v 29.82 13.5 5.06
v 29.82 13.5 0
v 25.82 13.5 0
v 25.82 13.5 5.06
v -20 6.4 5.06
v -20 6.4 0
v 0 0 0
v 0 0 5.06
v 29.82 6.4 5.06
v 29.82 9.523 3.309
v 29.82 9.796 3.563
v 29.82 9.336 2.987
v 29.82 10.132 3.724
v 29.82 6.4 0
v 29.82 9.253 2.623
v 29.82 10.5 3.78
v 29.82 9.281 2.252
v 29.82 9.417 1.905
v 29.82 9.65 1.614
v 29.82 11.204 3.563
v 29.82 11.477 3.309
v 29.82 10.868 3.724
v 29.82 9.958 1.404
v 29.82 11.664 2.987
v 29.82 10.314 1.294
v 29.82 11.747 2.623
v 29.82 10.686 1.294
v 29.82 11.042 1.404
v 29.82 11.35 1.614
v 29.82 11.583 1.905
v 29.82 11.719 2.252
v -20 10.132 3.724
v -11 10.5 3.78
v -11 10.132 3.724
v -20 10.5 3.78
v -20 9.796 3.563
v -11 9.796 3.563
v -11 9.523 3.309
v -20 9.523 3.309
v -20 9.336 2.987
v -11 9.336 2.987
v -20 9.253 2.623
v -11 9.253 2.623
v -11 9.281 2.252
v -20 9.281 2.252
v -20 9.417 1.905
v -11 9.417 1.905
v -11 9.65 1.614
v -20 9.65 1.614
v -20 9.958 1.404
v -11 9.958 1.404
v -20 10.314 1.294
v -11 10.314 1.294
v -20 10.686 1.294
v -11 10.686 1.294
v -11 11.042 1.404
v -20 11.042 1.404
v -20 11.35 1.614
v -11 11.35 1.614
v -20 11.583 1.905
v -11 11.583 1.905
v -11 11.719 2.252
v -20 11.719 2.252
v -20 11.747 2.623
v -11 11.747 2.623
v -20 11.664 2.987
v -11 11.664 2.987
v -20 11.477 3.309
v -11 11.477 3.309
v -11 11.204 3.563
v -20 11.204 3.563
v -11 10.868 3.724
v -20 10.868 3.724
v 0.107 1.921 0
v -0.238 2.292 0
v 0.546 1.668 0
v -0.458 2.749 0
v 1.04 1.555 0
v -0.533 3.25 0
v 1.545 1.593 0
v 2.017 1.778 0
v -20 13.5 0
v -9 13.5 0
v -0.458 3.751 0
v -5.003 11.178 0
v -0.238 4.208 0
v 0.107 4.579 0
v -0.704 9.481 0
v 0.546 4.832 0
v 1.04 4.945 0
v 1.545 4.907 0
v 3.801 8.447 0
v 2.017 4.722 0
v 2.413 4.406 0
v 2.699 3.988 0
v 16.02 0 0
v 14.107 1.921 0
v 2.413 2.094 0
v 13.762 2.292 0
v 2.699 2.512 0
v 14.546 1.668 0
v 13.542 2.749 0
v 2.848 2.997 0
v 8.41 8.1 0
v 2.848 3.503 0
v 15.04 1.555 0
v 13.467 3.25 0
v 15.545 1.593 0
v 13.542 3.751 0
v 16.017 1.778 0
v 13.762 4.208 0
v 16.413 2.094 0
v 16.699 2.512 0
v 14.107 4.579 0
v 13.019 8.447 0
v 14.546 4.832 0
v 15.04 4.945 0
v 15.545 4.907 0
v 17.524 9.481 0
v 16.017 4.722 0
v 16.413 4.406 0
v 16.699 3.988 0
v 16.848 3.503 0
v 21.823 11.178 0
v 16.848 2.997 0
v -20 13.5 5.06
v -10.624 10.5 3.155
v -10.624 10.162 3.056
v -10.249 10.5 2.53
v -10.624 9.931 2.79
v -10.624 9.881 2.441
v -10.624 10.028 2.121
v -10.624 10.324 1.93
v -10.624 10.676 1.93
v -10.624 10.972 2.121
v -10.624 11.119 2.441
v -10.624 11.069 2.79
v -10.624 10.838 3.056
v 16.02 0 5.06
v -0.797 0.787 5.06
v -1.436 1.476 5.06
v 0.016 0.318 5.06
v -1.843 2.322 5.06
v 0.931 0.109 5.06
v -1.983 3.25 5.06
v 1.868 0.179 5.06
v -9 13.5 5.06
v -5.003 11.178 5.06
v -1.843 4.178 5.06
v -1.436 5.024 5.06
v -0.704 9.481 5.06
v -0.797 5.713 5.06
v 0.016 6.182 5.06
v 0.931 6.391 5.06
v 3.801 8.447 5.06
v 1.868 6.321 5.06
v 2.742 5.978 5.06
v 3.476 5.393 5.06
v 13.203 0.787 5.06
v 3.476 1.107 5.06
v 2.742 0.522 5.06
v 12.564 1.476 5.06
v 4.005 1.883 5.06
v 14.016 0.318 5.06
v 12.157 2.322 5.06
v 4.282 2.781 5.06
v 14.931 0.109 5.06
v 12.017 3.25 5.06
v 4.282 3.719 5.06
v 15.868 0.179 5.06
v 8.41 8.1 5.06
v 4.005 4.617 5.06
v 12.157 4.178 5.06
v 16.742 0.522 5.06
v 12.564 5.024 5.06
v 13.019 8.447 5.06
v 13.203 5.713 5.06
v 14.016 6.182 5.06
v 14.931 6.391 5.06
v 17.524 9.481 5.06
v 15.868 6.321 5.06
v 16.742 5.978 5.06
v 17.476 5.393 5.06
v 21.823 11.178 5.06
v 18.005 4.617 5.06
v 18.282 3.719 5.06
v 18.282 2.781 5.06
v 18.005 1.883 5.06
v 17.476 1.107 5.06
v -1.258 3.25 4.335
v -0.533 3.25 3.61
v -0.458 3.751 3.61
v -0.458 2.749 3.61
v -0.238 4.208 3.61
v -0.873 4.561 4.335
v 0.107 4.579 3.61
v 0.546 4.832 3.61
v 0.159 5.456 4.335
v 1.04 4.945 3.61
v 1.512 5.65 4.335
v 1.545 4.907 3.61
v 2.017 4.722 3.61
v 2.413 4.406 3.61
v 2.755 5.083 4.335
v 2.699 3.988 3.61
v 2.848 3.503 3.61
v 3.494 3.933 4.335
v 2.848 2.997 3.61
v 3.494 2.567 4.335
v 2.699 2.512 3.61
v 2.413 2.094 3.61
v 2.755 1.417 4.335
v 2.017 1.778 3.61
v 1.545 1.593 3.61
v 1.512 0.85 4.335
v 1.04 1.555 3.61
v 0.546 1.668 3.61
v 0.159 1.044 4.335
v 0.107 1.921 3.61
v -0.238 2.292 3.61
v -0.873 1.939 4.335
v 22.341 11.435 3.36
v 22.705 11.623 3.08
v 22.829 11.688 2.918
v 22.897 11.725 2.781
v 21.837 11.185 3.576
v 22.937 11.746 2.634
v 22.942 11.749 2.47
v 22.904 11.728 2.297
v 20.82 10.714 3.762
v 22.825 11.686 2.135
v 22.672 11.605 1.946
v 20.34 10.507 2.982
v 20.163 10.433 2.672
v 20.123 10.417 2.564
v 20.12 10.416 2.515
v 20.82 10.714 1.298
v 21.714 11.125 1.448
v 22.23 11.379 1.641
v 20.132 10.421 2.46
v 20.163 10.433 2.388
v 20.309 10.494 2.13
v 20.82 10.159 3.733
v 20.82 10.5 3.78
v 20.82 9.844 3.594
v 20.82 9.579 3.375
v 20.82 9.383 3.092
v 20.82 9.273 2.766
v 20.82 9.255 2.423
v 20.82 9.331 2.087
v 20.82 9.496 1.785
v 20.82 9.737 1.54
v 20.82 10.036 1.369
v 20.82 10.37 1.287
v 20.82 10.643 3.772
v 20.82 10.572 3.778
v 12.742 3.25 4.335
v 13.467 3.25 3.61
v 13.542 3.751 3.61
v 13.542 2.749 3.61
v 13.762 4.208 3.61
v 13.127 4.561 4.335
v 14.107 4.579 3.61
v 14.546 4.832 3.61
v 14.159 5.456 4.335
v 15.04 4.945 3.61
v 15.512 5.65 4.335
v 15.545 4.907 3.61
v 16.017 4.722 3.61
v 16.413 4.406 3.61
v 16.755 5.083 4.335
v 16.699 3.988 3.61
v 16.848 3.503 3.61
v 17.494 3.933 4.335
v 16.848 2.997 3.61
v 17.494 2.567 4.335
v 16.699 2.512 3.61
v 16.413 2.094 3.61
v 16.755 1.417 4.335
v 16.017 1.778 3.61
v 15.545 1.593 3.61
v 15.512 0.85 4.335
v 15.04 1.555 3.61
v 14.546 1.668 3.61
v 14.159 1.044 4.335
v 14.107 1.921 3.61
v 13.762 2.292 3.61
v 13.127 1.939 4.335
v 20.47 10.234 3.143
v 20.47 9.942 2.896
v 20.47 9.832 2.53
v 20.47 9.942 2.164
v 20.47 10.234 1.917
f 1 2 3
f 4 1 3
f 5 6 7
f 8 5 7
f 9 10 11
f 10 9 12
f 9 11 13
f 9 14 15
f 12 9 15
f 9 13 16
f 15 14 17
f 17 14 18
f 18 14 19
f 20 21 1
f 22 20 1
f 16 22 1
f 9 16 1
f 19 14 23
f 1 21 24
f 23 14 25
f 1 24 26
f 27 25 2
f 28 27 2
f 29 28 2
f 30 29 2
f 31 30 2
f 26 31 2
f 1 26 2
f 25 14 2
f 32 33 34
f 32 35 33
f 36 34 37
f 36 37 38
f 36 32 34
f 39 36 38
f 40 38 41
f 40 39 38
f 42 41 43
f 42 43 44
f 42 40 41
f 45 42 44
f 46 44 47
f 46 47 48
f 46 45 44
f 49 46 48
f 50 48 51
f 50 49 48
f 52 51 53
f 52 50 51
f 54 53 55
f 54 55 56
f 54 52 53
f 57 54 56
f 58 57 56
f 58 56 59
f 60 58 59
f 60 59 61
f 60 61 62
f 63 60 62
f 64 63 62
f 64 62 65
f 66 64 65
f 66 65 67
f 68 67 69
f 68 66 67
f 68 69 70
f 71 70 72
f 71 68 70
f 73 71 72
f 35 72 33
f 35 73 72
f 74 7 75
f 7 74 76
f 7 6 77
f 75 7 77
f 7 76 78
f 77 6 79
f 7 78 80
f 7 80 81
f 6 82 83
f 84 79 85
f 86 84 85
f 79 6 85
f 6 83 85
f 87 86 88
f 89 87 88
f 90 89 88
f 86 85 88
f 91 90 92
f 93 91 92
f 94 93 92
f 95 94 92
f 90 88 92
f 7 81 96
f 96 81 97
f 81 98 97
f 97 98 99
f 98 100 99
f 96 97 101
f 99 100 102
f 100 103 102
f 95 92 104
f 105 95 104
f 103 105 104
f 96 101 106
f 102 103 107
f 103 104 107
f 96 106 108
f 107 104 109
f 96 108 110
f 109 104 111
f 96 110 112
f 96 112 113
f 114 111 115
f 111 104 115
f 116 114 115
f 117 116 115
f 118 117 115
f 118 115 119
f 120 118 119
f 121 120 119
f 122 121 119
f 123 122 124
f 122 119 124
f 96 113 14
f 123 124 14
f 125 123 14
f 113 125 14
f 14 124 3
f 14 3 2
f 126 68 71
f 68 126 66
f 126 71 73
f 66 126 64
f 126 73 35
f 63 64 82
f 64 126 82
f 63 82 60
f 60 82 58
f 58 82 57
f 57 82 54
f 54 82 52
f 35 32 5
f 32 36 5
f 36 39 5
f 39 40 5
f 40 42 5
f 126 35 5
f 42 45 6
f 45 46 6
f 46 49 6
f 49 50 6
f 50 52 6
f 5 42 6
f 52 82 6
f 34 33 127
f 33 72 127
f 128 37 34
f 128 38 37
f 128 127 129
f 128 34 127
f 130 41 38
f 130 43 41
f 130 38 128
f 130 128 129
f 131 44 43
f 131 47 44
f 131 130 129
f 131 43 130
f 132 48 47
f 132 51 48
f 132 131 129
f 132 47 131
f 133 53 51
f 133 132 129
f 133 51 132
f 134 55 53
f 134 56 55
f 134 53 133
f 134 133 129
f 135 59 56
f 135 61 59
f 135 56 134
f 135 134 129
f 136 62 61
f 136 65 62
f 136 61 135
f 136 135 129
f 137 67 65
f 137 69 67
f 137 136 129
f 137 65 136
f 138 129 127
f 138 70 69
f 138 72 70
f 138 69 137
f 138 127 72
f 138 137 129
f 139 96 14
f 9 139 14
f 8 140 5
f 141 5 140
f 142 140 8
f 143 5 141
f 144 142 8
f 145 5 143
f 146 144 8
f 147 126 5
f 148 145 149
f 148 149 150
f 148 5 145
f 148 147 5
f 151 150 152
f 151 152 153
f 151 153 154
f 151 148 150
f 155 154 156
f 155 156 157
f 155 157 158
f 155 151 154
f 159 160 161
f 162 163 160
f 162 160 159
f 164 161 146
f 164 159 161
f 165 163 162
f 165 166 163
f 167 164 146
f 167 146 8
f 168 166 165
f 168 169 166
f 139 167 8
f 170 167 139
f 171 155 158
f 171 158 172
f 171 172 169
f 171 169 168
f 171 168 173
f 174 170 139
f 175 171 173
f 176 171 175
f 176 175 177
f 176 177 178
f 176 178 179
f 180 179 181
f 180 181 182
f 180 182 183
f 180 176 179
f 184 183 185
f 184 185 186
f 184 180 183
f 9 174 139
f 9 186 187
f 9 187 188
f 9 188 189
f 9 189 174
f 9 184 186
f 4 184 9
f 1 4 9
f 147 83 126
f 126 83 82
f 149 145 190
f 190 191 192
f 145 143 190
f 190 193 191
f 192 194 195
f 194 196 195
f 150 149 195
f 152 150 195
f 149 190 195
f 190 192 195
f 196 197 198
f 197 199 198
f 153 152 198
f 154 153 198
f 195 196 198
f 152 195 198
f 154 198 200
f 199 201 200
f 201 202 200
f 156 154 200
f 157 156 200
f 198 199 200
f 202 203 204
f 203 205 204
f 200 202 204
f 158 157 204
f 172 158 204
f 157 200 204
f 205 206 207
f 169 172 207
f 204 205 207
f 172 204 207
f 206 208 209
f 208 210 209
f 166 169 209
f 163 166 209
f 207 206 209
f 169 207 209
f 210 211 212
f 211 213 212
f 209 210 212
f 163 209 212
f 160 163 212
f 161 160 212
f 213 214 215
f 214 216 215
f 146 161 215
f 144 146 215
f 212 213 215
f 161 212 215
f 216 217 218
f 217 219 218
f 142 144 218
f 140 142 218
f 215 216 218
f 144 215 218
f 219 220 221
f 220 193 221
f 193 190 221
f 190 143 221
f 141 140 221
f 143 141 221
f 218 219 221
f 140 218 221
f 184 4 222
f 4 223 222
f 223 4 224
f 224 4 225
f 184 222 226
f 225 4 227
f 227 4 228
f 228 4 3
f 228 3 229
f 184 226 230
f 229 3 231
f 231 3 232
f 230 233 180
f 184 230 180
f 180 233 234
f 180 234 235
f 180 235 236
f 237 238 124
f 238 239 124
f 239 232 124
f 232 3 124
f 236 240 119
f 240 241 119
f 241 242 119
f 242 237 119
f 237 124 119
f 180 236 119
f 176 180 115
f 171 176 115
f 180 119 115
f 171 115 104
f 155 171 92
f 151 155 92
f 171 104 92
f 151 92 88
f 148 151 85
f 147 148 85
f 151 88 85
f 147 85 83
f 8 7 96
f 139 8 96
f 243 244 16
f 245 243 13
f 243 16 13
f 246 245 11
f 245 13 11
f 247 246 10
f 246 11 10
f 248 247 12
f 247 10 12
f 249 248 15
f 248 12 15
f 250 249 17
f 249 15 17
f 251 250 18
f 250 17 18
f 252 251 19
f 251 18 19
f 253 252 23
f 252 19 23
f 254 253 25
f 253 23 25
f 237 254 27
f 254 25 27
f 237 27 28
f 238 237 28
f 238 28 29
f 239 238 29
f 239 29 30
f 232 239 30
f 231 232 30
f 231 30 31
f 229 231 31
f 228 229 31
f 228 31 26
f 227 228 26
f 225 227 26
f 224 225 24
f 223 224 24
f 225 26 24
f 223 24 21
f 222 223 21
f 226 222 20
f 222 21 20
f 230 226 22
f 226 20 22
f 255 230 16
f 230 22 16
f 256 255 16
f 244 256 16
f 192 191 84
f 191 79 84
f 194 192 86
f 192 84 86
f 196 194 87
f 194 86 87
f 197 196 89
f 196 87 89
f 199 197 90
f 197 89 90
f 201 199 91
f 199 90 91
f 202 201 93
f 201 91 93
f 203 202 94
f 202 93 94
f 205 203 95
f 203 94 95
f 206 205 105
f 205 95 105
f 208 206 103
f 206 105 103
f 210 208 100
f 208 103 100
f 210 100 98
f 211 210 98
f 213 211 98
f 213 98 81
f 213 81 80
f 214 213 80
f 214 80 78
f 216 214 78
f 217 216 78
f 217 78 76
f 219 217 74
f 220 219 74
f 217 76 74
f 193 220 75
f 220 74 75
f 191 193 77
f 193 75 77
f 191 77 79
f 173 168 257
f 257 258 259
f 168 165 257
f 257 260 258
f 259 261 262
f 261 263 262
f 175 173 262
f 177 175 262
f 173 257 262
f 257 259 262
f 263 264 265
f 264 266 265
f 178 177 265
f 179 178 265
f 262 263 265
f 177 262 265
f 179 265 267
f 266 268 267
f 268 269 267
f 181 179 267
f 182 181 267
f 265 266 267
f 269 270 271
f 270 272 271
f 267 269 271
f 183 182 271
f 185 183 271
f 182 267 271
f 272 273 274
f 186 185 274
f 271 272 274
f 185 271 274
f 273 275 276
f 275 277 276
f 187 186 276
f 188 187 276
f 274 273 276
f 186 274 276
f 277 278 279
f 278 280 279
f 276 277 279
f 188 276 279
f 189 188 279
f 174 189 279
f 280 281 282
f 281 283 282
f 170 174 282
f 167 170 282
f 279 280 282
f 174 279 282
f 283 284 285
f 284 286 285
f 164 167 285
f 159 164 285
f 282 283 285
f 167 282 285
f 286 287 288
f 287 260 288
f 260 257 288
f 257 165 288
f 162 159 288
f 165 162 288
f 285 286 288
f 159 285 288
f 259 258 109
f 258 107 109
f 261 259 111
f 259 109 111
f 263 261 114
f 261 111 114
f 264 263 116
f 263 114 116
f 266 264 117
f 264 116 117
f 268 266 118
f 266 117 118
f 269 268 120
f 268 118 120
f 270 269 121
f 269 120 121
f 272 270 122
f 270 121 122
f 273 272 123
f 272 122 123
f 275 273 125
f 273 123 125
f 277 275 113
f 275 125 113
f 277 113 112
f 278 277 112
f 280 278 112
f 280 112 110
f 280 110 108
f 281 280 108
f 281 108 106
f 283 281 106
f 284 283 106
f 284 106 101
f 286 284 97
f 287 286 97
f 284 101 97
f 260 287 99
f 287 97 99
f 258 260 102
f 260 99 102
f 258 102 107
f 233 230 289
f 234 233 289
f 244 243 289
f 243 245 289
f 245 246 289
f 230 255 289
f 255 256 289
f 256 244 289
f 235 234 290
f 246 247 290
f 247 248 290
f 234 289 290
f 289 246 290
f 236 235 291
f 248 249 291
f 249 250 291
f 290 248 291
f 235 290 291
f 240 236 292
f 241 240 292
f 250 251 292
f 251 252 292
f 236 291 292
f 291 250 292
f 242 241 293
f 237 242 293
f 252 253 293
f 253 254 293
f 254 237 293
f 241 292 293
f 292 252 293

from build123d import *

# Parameters (mm, degrees)
ESTRUSIONE_ESTRUSIONE1_DEPTH           = 5.06
FORO_SVASATO_PER_VITE_M3_2_D           = 3.4
FORO_SVASATO_PER_VITE_M3_2_CSINK_D     = 6.3
FORO_SVASATO_PER_VITE_M3_2_CSINK_ANGLE = 90


with BuildPart() as part:
    # Schizzo4 → Estrusione-Estrusione1 (new body)
    with BuildSketch(Plane.XY):
        with BuildLine():
            Line((-20, 6.4), (0, 0))
            Line((0, 0), (16.02, 0))
            Line((16.02, 0), (29.82, 6.4))
            Line((29.82, 6.4), (29.82, 13.5))
            Line((29.82, 13.5), (25.82, 13.5))
            ThreePointArc((25.82, 13.5), (8.41, 8.1), (-9, 13.5))
            Line((-9, 13.5), (-20, 13.5))
            Line((-20, 13.5), (-20, 6.4))
        make_face()
    extrude(amount=ESTRUSIONE_ESTRUSIONE1_DEPTH)

    # Schizzo7 → Foro filettato M3x0.5-1 (revolve, cut)
    with BuildSketch(Plane(origin=(-20, 10.5, 2.53), x_dir=(0, 0, 1), z_dir=(0, 1, 0))):
        Polygon((0, 0), (0, 9.751075774), (1.25, 9), (1.25, 0), align=None)
    foro_filettato_m3x0_5_1 = revolve(axis=Axis((-26.35, 10.5, 2.53), (1, 0, 0)), mode=Mode.SUBTRACT)

    # Specchia1: Foro filettato M3x0.5-1 across plane
    add(foro_filettato_m3x0_5_1.mirror(Plane.ZY.offset(-4.91)), mode=Mode.SUBTRACT)

    # Foro svasato per Vite M3-2 (through all)
    with Locations(Plane(origin=(-33.438661509, -29.329137282, 5.06), x_dir=(1, 0, 0), z_dir=(0, 0, 1))):
        with Locations((34.605533153, 32.579137282), (48.605533153, 32.579137282)):
            CounterSinkHole(FORO_SVASATO_PER_VITE_M3_2_D / 2, FORO_SVASATO_PER_VITE_M3_2_CSINK_D / 2, counter_sink_angle=FORO_SVASATO_PER_VITE_M3_2_CSINK_ANGLE)


solid = part.part
